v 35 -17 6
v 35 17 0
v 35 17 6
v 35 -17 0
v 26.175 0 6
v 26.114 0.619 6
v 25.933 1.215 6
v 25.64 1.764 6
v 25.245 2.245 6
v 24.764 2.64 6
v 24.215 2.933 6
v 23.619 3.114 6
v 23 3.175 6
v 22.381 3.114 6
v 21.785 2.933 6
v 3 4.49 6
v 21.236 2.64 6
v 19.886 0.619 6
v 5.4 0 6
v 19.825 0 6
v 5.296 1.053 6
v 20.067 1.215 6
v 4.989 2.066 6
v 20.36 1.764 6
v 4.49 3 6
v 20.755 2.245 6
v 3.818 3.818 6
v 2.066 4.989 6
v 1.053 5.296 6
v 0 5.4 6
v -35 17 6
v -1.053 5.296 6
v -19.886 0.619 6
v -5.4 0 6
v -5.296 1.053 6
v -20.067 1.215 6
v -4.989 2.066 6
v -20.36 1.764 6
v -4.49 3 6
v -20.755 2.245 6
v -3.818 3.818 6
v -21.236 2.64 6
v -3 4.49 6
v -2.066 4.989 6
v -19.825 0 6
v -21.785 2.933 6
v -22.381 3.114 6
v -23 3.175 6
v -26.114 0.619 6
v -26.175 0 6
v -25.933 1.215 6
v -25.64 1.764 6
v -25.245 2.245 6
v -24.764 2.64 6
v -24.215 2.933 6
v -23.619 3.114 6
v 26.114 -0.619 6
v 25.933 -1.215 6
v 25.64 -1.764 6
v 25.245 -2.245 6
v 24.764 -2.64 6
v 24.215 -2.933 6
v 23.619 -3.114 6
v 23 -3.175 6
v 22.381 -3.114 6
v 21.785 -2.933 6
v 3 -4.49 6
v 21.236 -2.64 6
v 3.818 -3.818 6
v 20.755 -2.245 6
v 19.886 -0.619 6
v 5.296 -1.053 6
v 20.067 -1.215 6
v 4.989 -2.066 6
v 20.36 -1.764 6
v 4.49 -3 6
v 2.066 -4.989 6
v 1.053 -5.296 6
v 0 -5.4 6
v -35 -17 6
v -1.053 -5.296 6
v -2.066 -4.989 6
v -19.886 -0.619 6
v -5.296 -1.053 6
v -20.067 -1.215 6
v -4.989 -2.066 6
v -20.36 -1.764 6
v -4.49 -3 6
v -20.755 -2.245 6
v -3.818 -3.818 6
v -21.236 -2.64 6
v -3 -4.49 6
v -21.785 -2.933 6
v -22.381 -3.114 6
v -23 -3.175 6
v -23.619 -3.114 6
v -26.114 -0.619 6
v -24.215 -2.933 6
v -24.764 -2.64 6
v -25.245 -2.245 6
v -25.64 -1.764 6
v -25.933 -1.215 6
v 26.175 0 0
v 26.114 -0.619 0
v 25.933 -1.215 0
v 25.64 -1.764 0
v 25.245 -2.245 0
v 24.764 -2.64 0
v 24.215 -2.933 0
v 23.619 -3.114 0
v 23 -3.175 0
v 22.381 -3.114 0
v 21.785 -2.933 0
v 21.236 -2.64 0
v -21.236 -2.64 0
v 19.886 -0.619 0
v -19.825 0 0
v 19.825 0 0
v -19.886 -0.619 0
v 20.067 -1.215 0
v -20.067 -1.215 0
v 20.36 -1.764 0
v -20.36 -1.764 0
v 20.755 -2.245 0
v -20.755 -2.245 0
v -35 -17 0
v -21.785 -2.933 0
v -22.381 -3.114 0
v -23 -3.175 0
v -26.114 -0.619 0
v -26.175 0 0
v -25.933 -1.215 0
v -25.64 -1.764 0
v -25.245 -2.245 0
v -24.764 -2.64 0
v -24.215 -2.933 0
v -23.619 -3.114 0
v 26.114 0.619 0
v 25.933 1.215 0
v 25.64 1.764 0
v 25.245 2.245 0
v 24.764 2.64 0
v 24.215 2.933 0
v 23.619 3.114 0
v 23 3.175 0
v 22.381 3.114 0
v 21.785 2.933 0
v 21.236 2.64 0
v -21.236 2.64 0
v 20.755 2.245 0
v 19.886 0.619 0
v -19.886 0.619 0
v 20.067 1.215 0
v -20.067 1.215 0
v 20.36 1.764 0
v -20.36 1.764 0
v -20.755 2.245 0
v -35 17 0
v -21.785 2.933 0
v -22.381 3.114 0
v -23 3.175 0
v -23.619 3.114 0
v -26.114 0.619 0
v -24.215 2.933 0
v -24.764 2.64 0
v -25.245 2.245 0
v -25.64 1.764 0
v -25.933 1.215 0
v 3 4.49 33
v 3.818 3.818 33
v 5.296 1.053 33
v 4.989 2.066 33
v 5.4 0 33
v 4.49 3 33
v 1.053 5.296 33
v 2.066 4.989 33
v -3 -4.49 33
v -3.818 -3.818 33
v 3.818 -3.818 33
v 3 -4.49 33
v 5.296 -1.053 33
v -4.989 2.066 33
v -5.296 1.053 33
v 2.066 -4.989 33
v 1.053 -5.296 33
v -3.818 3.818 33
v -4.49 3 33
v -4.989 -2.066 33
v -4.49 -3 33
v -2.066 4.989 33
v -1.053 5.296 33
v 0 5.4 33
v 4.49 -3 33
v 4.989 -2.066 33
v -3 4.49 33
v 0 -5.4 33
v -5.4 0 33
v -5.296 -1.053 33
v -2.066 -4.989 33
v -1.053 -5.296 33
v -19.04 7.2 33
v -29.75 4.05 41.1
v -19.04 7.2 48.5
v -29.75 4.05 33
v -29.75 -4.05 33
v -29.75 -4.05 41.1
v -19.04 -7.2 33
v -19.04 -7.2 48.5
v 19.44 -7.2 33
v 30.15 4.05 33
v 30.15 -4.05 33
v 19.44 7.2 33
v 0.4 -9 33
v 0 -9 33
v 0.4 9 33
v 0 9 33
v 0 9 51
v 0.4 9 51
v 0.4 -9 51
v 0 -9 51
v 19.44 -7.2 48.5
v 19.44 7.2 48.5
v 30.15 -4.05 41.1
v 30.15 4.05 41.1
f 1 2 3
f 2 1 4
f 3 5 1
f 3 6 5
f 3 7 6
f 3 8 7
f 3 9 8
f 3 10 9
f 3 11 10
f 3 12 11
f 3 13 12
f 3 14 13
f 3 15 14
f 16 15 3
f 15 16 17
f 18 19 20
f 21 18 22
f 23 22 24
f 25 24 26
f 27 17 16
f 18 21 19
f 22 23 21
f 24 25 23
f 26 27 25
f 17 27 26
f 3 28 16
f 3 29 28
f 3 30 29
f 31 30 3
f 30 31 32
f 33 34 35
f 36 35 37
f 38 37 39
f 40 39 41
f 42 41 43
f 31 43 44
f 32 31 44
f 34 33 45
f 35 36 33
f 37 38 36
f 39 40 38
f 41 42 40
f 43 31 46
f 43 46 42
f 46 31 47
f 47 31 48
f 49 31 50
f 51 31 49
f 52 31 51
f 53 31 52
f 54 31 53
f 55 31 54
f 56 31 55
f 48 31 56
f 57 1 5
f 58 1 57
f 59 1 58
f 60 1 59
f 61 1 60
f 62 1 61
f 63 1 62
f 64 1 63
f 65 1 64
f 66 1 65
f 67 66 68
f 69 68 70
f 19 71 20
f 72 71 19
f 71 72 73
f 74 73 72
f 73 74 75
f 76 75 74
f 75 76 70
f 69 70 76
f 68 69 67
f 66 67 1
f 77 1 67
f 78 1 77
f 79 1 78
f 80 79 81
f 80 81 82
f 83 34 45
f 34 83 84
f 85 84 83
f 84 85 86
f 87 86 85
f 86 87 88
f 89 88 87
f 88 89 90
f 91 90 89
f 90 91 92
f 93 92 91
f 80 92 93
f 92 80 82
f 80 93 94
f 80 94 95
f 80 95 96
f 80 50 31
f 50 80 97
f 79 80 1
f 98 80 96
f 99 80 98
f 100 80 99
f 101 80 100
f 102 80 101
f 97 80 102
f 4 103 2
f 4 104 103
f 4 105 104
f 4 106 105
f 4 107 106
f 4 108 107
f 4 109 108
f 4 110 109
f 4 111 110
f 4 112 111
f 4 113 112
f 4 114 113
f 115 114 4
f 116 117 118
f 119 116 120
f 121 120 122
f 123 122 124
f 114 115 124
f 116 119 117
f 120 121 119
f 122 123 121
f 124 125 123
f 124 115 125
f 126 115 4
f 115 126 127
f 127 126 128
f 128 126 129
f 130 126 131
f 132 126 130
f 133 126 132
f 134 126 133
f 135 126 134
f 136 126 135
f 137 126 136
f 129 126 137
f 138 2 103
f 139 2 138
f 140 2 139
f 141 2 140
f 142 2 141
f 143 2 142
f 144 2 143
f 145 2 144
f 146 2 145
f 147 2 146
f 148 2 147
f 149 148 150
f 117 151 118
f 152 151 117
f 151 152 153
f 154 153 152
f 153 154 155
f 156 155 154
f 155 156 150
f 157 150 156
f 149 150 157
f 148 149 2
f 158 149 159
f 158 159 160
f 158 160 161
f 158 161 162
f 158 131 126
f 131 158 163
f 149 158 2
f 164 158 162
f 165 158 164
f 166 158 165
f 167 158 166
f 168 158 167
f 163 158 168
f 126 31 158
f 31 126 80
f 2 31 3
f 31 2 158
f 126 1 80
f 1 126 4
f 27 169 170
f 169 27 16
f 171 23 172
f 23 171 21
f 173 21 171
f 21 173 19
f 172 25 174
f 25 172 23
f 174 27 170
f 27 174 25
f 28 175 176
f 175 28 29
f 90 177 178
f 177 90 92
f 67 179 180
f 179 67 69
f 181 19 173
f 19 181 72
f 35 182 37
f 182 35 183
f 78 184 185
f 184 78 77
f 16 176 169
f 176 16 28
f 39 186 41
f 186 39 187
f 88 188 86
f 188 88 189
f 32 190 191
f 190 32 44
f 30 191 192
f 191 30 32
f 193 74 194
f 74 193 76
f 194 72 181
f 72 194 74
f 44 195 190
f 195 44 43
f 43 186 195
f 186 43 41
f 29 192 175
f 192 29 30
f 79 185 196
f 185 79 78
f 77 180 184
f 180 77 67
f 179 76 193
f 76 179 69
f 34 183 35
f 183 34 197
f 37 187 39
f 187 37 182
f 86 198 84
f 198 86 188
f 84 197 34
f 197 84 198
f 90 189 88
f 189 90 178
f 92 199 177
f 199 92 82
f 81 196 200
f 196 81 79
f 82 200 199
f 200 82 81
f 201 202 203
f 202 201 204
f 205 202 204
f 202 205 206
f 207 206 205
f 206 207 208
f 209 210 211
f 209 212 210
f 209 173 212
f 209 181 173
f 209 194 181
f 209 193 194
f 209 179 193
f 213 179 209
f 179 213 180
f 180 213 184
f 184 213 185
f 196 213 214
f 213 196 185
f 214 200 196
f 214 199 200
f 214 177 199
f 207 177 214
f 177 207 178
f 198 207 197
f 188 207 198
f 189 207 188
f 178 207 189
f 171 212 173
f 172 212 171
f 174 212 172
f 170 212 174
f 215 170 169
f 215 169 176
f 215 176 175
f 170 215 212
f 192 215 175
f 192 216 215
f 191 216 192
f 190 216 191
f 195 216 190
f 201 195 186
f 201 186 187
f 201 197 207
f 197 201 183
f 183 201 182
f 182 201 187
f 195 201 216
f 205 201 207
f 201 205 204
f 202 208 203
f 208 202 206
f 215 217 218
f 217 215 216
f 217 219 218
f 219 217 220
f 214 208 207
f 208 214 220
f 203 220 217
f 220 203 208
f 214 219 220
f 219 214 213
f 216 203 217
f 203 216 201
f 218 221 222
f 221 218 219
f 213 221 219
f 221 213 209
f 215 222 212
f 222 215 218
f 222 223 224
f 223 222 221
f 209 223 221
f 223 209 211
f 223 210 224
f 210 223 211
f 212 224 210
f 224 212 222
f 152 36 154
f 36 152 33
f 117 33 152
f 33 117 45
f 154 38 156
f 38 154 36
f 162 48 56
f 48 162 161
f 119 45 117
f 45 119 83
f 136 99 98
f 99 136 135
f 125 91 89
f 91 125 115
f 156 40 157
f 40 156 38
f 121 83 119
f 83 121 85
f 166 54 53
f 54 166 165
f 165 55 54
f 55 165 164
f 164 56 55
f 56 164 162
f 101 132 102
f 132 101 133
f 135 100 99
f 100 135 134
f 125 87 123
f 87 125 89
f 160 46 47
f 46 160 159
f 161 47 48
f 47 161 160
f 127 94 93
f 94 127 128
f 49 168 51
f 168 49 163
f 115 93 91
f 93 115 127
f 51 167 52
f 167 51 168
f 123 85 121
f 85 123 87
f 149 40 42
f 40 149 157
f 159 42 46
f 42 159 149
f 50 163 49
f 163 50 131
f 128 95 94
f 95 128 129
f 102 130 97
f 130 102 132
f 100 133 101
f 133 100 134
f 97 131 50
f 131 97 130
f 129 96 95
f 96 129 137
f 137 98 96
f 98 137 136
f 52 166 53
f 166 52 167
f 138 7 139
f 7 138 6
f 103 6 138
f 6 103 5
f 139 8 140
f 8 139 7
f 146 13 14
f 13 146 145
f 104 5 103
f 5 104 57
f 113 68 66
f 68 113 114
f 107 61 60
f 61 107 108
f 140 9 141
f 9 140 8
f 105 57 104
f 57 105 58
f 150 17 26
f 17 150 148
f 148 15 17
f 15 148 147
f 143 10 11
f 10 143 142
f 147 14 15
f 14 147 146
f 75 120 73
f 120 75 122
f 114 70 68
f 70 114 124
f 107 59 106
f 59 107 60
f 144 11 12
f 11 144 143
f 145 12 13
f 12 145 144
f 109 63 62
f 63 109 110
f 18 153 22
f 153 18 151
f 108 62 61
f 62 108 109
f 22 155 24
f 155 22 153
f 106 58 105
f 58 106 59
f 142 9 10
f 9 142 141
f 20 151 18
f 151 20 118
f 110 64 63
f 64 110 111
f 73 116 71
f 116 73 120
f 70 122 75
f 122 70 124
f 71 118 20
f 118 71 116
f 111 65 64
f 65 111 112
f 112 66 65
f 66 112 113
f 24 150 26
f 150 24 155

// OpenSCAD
$fn = 32;

// ----------------------------------------------------------------------
// Boat cleat: 70 mm base, horn 42 mm up
// ----------------------------------------------------------------------

// --- parameters (mm) ---
base_l = 70;              // base length
base_w = 34;              // base width
base_t = 6;               // base thickness
horn_len = 59.5;          // horn length
horn_d = 18;              // horn diameter at the middle
horn_z = 42;              // horn axis height
end_drop = 10;            // how far the horn tips drop
post_d = 10.8;            // centre post diameter
holes_d = 6.35;           // fixing holes
hole_x = 23;              // fixing hole spacing

difference() {
  union() {
    translate([-35, -17, 0]) cube([base_l, base_w, base_t]);
    /* centre post, sunk 1 mm into the base */
    translate([0, 0, 5]) cylinder(h = 37, d = post_d);
    /* horn: a hull chain of boxes, full in the middle and lighter at the tips */
    hull() {
      translate([-29.75, -4.05, 33]) cube([0.4, 8.1, 8.1], center = false);
      translate([-19.04, -7.2, 33]) cube([0.4, 14.4, 15.5], center = false);
    }
    hull() {
      translate([-19.04, -7.2, 33]) cube([0.4, 14.4, 15.5], center = false);
      translate([0, -9, 33]) cube([0.4, 18, 18], center = false);
    }
    hull() {
      translate([0, -9, 33]) cube([0.4, 18, 18], center = false);
      translate([19.04, -7.2, 33]) cube([0.4, 14.4, 15.5], center = false);
    }
    hull() {
      translate([19.04, -7.2, 33]) cube([0.4, 14.4, 15.5], center = false);
      translate([29.75, -4.05, 33]) cube([0.4, 8.1, 8.1], center = false);
    }
  }
  translate([-23, 0, -2.5]) cylinder(h = base_t + 5, d = holes_d);
  translate([23, 0, -2.5]) cylinder(h = base_t + 5, d = holes_d);
}
